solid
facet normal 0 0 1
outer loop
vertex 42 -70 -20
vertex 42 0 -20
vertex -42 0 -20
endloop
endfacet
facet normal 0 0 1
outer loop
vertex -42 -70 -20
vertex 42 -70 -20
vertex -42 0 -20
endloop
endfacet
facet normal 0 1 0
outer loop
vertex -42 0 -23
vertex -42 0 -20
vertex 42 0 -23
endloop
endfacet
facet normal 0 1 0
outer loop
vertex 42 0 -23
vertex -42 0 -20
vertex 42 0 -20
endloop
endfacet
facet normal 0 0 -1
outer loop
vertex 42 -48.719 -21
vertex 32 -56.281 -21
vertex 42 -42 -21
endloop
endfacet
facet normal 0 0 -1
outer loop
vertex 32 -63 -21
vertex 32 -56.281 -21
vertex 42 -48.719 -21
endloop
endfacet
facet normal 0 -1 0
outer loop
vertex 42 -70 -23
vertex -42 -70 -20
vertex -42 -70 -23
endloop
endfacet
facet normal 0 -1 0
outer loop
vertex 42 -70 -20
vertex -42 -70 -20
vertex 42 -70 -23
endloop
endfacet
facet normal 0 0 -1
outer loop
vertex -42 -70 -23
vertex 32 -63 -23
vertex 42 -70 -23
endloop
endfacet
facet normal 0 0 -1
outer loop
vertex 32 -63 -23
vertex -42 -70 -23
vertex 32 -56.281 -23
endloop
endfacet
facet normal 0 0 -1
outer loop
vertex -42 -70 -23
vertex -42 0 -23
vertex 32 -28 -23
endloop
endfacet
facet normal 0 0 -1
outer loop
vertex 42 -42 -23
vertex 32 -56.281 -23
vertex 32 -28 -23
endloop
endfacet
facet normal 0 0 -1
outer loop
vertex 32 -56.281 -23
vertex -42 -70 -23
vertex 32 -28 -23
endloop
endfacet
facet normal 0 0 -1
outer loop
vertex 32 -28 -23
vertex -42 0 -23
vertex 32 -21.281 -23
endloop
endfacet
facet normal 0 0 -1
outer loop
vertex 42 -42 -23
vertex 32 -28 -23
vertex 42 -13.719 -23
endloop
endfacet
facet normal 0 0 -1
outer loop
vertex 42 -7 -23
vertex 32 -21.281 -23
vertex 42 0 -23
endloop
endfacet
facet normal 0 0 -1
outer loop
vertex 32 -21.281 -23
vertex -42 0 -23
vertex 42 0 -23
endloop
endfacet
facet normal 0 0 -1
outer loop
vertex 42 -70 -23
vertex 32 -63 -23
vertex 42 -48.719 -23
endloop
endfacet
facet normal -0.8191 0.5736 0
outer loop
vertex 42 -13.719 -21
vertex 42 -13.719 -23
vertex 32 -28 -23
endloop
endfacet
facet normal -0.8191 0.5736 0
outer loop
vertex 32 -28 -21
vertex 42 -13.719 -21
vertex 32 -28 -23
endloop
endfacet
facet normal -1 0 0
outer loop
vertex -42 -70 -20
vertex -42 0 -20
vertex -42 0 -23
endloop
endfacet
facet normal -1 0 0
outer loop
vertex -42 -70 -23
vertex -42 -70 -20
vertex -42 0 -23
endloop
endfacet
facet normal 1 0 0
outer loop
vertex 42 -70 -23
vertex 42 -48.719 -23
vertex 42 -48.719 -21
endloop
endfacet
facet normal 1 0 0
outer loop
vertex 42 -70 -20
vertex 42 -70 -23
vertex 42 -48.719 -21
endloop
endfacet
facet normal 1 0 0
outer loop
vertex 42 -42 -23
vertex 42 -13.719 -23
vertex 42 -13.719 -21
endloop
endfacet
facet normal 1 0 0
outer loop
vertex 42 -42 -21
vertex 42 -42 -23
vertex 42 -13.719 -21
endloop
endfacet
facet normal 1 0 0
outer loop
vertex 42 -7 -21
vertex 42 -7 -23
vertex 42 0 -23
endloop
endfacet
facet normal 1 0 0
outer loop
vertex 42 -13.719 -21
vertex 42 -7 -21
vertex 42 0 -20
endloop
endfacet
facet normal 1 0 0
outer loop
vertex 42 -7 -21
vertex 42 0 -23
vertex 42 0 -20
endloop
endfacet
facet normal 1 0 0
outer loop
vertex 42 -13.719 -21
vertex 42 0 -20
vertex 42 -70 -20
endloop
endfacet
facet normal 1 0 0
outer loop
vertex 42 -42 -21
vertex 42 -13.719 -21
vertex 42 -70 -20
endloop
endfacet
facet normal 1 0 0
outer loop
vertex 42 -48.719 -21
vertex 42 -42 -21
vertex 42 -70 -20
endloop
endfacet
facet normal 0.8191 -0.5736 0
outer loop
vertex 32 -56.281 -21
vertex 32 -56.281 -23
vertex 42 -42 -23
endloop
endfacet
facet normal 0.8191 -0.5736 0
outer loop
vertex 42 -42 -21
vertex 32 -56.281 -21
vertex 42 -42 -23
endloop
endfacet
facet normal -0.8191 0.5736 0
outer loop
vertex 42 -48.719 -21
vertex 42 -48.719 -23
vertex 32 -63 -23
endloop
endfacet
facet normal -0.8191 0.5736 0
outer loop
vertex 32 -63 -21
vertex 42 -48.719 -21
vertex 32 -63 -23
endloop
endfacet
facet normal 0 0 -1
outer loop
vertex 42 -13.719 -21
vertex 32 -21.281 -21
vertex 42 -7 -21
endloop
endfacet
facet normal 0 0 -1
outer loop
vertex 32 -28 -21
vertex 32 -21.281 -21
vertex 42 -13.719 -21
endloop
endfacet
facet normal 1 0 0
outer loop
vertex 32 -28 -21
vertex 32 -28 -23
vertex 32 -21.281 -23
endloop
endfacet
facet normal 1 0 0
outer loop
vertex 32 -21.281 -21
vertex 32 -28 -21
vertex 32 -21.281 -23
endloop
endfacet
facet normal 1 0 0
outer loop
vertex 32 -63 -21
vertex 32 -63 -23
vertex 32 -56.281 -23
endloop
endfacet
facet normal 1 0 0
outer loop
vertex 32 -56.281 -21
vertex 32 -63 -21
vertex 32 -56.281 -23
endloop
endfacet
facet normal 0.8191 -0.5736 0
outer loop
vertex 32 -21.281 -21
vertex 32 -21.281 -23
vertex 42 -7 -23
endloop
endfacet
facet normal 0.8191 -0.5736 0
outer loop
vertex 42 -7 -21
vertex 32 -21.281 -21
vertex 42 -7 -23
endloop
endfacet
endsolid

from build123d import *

# Parameters (mm, degrees)
F1_DEPTH = 70
F3_DEPTH = 2


# Not quite as in the source:
# - a feature names something its author has since deleted; it is built from what else it names


with BuildPart() as f1:
    # F0 (on Front) → F1 (new body)
    with BuildSketch(Plane.XZ):
        Polygon((0, -20), (0, -23), (32, -23), (32, -21), (38, -21), (42, -21), (42, -20), align=None)
        Polygon((-32, -23), (0, -23), (0, -20), (-17, -20), (-21, -20), (-30, -20), (-34, -20), (-34, -21), (-32, -21), align=None)
        Polygon((32, -21), (32, -23), (38, -23), (38, -22.25), (38, -21), align=None)
        Polygon((-38, -23), (-32, -23), (-32, -21), (-34, -21), (-38, -21), (-38, -22.25), align=None)
        Polygon((38, -22.25), (38, -23), (42, -23), (42, -21), (38, -21), align=None)
        Polygon((-42, -23), (-38, -23), (-38, -22.25), (-38, -21), (-42, -21), align=None)
        Polygon((-38, -21), (-34, -21), (-34, -20), (-42, -20), (-42, -21), align=None)
    extrude(amount=F1_DEPTH)

    # F2 (on face) → F3 (cut)
    with BuildSketch(Plane(origin=(0, 0, -23), x_dir=(1, 0, 0), z_dir=(0, 0, -1))):
        Polygon((42, 42), (42, 48.7185199326), (32, 63), (32, 56.2814800674), align=None)
        Polygon((42, 7), (42, 13.7185199326), (32, 28), (32, 21.2814800674), align=None)
    extrude(amount=-F3_DEPTH, mode=Mode.SUBTRACT)


solid = f1.part
